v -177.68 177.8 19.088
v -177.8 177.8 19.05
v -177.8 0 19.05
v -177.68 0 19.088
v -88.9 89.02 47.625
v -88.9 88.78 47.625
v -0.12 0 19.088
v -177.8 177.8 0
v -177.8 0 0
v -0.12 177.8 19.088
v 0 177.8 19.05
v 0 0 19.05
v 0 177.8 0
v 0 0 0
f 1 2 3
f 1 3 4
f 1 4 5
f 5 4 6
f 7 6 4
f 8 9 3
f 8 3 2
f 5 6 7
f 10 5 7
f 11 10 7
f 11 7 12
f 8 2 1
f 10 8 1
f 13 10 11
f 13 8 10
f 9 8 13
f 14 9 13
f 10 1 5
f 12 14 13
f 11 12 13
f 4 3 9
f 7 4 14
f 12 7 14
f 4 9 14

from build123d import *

# Parameters (mm, degrees)
F0_W     = 177.8
F0_H     = 177.8
F1_DEPTH = 47.625
F4_DEPTH = 177.801
F5_DEPTH = 177.801


# Not quite as in the source:
# - ends of sketch curves that miss each other by under 0.0002 mm in the source are joined


with BuildPart() as f1:
    # F0 (on Top) → F1 (new body)
    with BuildSketch(Plane.XY):
        with Locations((-88.9, 88.9)):
            Rectangle(F0_W, F0_H)
    extrude(amount=F1_DEPTH)

    # F3 (on face) → F4 (cut, through all)
    with BuildSketch(Plane(origin=(-177.8, 0, 0), x_dir=(0, -1, 0), z_dir=(-1, 0, 0))):
        Polygon((-177.8, 47.625), (-177.8, 19.0884657204), (-89.0196708441, 47.625), align=None)
        Polygon((-88.7803285837, 47.625), (2.861e-07, 19.0884657204), (0, 47.625), align=None)
    extrude(amount=-F4_DEPTH, mode=Mode.SUBTRACT)

    # F2 (on face) → F5 (cut, through all)
    with BuildSketch(Plane.XZ):
        Polygon((-177.8, 19.05), (-88.9, 47.625), (-177.8, 47.625), align=None)
        Polygon((-88.9, 47.625), (0, 19.05), (0, 47.625), align=None)
    extrude(amount=-F5_DEPTH, mode=Mode.SUBTRACT)


solid = f1.part
